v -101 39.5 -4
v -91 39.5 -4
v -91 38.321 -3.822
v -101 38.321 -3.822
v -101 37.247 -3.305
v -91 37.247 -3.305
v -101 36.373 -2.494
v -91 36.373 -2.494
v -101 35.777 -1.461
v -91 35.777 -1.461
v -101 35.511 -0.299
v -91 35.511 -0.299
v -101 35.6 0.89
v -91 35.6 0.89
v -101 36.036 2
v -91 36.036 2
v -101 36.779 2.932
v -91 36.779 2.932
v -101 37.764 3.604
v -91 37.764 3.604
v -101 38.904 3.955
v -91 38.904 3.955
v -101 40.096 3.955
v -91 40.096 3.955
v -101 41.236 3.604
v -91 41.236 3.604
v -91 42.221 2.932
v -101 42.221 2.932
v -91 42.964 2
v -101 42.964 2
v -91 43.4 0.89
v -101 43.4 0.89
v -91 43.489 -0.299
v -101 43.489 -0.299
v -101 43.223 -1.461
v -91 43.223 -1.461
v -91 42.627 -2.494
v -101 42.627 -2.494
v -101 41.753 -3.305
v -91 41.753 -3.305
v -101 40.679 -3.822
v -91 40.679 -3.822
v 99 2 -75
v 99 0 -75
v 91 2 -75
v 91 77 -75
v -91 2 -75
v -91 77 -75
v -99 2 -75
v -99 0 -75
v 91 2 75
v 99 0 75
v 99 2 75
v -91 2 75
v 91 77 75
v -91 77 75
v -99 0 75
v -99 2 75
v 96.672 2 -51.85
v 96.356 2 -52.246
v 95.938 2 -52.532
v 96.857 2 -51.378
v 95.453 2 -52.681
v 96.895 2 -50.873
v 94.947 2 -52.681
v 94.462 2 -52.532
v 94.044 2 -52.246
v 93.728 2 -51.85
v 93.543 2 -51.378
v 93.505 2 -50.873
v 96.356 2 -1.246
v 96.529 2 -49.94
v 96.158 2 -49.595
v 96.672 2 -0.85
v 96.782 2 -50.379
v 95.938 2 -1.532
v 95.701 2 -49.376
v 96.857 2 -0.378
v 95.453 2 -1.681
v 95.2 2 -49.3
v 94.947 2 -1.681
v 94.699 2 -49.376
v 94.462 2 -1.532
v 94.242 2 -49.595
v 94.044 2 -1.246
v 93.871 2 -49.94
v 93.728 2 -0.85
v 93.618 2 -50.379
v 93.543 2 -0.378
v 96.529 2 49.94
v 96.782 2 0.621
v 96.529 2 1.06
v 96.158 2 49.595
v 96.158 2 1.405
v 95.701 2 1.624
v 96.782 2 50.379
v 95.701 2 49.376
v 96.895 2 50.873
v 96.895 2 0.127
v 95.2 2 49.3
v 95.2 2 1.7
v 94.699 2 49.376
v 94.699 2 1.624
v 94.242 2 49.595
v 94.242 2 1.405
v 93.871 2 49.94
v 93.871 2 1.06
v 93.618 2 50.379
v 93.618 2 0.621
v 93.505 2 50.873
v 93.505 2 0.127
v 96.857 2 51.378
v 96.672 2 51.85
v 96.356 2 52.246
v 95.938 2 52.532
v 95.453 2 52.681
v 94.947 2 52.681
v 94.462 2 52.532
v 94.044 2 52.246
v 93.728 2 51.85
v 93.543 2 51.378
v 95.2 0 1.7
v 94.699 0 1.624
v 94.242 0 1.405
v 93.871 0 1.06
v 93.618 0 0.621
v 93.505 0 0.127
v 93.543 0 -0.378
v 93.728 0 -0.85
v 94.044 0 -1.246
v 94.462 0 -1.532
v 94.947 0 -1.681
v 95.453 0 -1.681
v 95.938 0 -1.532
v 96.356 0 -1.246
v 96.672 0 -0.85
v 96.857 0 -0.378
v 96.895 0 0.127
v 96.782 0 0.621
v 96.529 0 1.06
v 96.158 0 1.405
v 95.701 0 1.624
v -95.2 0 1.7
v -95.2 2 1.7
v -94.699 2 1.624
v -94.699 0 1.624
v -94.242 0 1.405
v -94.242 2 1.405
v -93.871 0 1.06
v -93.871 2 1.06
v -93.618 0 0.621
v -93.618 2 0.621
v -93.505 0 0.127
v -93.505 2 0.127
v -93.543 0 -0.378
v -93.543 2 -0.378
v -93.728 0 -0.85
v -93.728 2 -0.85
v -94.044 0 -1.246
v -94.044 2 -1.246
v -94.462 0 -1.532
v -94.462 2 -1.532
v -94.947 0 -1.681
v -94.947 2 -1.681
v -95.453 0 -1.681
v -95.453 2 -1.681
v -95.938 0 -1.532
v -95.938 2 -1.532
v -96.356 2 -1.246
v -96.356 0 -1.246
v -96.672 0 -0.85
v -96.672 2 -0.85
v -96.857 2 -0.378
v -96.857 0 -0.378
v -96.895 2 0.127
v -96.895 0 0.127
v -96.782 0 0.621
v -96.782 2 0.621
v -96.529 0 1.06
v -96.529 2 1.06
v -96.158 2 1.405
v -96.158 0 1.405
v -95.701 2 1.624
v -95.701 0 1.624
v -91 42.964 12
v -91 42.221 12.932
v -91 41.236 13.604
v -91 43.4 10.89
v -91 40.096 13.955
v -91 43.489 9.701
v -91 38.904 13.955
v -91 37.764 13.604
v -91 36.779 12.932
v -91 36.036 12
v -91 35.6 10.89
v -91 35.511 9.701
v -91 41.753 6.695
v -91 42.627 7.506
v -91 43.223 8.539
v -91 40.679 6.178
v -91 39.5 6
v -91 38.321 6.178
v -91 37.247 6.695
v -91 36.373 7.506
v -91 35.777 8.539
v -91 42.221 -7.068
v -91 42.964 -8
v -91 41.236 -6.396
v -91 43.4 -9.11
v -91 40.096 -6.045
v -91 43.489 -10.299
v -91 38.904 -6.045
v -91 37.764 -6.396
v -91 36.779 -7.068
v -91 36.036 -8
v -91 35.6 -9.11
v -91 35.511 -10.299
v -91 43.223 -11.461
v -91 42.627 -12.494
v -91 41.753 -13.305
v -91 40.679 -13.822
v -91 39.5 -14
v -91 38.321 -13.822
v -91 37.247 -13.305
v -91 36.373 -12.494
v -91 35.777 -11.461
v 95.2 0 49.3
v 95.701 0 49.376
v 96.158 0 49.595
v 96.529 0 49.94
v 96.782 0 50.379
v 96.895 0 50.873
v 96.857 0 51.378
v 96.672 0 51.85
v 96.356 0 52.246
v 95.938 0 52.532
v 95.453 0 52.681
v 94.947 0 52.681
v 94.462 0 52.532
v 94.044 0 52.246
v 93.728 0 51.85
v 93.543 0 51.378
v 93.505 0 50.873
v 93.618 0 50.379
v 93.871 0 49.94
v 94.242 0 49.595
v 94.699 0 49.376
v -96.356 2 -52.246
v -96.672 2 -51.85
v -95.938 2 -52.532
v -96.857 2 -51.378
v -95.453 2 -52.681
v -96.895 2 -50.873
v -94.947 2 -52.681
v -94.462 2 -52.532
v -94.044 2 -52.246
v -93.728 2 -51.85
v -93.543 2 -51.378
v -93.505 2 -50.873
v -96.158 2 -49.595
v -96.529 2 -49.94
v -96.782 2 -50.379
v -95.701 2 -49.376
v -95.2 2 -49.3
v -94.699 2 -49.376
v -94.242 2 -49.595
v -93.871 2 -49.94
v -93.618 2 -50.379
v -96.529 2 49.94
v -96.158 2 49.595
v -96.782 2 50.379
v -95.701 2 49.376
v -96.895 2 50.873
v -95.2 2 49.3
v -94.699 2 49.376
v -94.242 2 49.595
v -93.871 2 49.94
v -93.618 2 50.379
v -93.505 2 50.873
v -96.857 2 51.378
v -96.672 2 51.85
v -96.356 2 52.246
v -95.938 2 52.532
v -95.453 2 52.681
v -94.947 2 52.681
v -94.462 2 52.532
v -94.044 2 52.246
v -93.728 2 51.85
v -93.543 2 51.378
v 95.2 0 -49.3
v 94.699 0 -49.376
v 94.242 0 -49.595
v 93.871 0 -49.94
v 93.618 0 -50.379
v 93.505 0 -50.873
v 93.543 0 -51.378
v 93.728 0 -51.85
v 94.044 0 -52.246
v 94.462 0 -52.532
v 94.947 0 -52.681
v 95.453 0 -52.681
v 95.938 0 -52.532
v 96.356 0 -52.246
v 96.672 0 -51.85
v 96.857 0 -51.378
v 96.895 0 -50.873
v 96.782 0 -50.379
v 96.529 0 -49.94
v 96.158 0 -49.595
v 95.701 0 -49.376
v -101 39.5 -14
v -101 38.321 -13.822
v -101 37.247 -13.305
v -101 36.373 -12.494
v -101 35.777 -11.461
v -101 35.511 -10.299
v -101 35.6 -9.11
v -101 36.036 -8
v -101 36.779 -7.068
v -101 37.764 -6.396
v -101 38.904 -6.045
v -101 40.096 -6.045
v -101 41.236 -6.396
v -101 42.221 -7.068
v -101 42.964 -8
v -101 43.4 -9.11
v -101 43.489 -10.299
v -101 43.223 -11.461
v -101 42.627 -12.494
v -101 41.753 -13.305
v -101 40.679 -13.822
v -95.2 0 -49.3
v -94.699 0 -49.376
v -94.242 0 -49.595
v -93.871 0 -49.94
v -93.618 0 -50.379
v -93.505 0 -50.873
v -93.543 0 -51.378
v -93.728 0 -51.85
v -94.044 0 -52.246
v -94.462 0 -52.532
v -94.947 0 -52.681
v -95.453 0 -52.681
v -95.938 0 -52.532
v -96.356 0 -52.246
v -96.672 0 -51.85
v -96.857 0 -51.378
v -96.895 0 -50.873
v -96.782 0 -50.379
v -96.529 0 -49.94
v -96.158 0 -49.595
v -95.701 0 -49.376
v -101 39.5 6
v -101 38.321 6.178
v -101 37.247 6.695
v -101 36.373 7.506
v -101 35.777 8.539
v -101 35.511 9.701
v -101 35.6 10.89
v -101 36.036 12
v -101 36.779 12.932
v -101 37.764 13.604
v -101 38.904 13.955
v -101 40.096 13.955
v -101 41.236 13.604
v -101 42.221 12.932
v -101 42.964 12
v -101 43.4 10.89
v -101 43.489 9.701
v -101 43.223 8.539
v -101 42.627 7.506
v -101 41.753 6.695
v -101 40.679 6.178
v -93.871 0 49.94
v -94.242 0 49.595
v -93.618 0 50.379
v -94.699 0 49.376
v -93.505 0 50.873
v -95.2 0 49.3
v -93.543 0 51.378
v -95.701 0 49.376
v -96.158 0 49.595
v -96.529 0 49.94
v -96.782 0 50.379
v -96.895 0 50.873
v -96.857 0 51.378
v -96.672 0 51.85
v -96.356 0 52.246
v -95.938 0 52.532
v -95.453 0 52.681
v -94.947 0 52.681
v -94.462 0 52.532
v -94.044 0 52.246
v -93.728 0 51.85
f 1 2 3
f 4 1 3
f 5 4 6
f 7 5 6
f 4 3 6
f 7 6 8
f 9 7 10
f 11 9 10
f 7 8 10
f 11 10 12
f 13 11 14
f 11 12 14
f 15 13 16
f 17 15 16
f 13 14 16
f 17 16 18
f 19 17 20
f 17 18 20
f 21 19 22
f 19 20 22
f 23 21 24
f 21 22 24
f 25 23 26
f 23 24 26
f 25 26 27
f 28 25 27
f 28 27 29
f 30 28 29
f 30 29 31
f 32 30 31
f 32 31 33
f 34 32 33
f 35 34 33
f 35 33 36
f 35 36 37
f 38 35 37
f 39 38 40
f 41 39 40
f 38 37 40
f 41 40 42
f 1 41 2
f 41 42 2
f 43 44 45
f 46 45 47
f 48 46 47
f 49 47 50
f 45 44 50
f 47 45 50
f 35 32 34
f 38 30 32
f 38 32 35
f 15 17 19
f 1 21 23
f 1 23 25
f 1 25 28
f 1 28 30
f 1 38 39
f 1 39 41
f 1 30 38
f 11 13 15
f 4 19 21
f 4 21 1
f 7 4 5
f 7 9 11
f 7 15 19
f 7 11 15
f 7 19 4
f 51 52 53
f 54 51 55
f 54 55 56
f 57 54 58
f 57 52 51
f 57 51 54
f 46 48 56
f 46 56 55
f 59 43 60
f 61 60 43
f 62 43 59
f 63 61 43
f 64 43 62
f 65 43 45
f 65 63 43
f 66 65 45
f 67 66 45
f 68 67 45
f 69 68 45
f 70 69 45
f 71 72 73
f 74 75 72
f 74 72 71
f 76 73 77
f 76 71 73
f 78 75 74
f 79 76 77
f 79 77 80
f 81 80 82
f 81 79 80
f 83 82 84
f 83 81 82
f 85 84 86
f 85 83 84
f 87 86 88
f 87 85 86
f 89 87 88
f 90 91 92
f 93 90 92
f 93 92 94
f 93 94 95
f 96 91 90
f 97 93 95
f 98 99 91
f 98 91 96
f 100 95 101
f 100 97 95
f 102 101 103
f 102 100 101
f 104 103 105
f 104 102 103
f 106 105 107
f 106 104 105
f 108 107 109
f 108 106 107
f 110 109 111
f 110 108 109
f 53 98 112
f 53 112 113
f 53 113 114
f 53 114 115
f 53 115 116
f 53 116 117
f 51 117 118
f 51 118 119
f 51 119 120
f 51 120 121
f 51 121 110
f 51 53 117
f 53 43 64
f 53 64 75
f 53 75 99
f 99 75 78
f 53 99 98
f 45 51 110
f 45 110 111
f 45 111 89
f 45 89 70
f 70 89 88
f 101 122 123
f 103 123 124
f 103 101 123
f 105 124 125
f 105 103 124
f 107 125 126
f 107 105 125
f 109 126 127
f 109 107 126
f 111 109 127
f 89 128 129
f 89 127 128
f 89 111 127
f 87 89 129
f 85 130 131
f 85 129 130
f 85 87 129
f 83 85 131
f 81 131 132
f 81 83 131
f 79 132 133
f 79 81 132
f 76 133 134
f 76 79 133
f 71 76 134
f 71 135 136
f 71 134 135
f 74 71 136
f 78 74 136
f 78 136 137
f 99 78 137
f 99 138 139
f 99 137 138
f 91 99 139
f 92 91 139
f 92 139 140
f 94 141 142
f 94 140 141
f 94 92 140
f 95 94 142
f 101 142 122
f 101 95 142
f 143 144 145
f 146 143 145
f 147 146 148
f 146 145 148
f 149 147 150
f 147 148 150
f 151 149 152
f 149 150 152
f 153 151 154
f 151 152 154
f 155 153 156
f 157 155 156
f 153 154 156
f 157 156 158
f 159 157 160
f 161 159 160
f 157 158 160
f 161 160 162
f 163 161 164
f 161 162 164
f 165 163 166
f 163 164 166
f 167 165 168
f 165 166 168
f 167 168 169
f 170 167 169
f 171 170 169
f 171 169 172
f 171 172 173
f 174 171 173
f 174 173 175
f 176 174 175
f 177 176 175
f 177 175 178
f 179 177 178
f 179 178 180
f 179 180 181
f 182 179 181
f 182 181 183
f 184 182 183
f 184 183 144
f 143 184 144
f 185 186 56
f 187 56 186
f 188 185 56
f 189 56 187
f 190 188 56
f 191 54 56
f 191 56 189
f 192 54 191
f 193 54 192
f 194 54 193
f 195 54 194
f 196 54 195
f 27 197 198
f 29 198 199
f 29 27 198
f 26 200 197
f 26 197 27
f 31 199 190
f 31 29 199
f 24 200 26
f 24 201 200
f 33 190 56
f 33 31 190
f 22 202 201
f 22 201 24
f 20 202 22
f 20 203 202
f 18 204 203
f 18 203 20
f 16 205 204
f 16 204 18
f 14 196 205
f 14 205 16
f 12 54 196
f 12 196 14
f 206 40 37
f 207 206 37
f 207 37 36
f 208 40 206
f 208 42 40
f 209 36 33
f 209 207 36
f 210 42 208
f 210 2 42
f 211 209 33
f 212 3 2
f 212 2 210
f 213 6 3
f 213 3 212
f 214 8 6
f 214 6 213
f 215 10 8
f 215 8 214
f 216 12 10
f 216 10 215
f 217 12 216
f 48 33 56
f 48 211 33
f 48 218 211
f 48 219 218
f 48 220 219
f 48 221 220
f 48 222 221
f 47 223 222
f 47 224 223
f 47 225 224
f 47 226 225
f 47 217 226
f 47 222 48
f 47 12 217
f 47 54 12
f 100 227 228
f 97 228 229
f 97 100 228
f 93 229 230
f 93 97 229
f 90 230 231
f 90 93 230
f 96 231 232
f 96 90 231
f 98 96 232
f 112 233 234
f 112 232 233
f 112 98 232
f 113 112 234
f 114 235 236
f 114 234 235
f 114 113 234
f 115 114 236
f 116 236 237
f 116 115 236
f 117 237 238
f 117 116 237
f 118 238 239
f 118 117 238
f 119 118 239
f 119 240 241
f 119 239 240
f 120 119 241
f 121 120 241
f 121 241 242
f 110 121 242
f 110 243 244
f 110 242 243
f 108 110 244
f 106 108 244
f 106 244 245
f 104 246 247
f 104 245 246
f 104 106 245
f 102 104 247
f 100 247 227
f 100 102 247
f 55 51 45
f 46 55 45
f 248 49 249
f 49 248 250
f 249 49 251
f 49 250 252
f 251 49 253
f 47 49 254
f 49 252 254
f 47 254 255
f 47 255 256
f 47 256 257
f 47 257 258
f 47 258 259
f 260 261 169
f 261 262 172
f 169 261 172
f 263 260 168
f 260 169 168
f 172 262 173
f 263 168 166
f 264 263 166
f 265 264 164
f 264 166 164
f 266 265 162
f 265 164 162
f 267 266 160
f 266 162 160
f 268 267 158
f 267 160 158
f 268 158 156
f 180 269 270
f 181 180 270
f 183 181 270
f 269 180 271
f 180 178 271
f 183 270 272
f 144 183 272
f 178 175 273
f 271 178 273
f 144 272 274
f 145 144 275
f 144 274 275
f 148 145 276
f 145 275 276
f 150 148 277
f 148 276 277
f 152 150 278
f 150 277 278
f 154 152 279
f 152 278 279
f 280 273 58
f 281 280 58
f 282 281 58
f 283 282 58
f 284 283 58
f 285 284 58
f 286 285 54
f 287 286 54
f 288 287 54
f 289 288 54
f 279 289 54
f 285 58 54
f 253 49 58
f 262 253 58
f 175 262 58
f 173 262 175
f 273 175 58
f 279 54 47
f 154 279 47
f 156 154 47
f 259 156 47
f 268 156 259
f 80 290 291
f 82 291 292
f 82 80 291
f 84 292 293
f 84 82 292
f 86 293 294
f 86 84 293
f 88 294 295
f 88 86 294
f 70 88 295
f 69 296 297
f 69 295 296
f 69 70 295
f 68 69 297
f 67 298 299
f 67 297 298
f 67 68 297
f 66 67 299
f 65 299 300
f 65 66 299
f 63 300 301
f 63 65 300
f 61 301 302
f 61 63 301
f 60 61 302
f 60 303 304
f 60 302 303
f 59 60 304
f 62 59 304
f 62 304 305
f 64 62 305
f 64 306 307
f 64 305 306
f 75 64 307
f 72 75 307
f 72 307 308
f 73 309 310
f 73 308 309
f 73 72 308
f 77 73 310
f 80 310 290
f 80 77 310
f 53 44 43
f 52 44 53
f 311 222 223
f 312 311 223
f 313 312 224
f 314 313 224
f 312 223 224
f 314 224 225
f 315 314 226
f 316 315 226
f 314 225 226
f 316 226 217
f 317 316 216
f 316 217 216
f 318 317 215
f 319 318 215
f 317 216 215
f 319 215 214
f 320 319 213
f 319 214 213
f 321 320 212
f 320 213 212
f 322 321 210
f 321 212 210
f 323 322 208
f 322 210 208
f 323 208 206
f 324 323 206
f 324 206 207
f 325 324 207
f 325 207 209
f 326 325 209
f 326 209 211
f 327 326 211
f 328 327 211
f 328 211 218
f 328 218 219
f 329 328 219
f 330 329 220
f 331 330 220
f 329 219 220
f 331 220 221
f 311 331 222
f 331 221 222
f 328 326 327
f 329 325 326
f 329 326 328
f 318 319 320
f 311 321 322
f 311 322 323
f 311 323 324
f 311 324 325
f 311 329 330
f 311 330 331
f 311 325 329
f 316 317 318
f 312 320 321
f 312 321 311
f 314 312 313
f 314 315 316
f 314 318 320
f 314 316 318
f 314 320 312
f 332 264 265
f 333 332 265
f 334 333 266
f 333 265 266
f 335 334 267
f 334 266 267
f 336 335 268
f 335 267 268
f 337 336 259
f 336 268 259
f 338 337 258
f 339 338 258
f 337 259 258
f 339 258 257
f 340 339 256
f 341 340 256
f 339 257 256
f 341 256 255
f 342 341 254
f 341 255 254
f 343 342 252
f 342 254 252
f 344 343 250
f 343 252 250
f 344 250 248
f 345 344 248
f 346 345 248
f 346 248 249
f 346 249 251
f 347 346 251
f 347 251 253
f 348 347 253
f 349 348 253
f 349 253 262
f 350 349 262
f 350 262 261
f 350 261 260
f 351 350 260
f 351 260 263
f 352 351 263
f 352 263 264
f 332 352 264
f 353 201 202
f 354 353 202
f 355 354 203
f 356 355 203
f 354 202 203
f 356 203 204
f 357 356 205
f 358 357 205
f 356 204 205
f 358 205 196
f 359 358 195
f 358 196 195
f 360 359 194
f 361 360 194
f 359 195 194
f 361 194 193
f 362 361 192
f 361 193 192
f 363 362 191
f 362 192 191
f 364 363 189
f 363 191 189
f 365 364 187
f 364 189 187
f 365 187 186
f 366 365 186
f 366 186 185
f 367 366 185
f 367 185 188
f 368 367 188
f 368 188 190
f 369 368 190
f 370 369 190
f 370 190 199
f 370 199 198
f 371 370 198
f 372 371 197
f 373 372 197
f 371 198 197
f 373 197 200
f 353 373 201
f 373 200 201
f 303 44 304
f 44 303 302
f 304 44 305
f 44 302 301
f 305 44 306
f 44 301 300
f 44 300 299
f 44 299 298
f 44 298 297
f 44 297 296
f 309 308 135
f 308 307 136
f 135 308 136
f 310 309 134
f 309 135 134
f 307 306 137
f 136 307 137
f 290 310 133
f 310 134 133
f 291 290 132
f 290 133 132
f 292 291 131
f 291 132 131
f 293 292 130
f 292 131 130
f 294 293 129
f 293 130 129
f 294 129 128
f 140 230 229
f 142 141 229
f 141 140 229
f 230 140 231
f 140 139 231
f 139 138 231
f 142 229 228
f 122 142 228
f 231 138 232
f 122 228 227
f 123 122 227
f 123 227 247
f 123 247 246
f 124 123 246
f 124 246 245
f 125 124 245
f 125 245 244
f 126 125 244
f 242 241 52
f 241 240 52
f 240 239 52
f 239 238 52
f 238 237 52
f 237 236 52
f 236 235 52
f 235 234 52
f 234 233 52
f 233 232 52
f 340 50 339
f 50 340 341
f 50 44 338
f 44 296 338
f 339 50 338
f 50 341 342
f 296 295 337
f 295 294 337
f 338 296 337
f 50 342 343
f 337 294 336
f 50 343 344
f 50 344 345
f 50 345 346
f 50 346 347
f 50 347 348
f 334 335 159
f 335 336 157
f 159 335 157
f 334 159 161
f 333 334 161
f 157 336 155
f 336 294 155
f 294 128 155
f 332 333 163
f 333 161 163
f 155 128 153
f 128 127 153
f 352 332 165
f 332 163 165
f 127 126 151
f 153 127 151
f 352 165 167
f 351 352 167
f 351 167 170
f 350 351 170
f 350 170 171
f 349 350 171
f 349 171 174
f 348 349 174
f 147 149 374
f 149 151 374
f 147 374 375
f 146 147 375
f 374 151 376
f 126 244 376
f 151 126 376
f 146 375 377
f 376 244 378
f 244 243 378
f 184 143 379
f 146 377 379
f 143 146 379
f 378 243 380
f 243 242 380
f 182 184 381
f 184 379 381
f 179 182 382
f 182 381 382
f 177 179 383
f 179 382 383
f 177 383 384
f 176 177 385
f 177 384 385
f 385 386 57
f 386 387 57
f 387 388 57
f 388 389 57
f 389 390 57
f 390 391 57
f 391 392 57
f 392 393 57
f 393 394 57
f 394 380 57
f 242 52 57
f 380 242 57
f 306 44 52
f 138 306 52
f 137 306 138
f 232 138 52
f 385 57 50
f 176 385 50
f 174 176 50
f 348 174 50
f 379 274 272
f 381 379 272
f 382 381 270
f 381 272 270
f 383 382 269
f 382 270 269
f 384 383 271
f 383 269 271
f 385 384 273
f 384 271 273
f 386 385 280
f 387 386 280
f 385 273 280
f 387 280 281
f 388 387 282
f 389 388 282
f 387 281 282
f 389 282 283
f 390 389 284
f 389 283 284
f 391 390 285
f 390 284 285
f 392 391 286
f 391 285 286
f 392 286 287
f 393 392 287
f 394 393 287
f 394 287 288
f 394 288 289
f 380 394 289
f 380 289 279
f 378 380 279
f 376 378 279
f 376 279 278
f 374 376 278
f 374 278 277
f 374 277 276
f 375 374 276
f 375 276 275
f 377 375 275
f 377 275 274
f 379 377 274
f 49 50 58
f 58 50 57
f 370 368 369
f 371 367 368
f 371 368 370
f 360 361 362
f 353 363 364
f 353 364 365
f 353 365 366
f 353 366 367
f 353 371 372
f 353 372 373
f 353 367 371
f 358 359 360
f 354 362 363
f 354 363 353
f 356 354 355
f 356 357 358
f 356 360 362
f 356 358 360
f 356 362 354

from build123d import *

# Parameters (mm, degrees)
SKETCH_1_W          = 182
SKETCH_1_H          = 150
EXTRUDE_1_DEPTH     = 77
SKETCH_2_W          = 8
SKETCH_2_H          = 150
EXTRUDE_2_DEPTH     = 2
SKETCH_3_R          = 1.7
CUT_EXTRUDE_1_DEPTH = 146.089627472
SKETCH_4_R          = 4
EXTRUDE_3_DEPTH     = 10


with BuildPart() as part:
    # 草图1 → 凸台-拉伸1 (new body)
    with BuildSketch(Plane(origin=(0, 0, 0), x_dir=(1, 0, 0), z_dir=(0, 1, 0))):
        Rectangle(SKETCH_1_W, SKETCH_1_H)
    extrude(amount=EXTRUDE_1_DEPTH)

    # 草图2 → 凸台-拉伸2 (add)
    with BuildSketch(Plane.XZ):
        with Locations((-95, 0)):
            Rectangle(SKETCH_2_W, SKETCH_2_H)
    extrude_2 = extrude(amount=-EXTRUDE_2_DEPTH)

    # 草图3 → 切除-拉伸1 (cut, through all)
    with BuildSketch(Plane(origin=(0, 2, 0), x_dir=(1, 0, 0), z_dir=(0, 1, 0))):
        with Locations(Location((-95.2, 51, 0), (0, 0, 270))):
            Circle(SKETCH_3_R)
        with Locations(Location((-95.2, -51, 0), (0, 0, 90))):
            Circle(SKETCH_3_R)
        with Locations(Location((-95.2, 0, 0), (0, 0, 270))):
            Circle(SKETCH_3_R)
    cut_extrude_1 = extrude(amount=-CUT_EXTRUDE_1_DEPTH, mode=Mode.SUBTRACT)

    # 镜向1: 凸台-拉伸2, 切除-拉伸1 across plane
    add(extrude_2.mirror(Plane(origin=(0, 0, 0), x_dir=(0, 0, 1), z_dir=(1, 0, 0))))
    add(cut_extrude_1.mirror(Plane(origin=(0, 0, 0), x_dir=(0, 0, 1), z_dir=(1, 0, 0))), mode=Mode.SUBTRACT)

    # 草图4 → 凸台-拉伸3 (add)
    with BuildSketch(Plane.ZY.offset(91)):
        with Locations(Location((0, 39.5, 0), (0, 0, 180))):
            Circle(SKETCH_4_R)
        with Locations(Location((10, 39.5, 0), (0, 0, 180))):
            Circle(SKETCH_4_R)
        with Locations(Location((-10, 39.5, 0), (0, 0, 180))):
            Circle(SKETCH_4_R)
    extrude(amount=EXTRUDE_3_DEPTH)


solid = part.part
